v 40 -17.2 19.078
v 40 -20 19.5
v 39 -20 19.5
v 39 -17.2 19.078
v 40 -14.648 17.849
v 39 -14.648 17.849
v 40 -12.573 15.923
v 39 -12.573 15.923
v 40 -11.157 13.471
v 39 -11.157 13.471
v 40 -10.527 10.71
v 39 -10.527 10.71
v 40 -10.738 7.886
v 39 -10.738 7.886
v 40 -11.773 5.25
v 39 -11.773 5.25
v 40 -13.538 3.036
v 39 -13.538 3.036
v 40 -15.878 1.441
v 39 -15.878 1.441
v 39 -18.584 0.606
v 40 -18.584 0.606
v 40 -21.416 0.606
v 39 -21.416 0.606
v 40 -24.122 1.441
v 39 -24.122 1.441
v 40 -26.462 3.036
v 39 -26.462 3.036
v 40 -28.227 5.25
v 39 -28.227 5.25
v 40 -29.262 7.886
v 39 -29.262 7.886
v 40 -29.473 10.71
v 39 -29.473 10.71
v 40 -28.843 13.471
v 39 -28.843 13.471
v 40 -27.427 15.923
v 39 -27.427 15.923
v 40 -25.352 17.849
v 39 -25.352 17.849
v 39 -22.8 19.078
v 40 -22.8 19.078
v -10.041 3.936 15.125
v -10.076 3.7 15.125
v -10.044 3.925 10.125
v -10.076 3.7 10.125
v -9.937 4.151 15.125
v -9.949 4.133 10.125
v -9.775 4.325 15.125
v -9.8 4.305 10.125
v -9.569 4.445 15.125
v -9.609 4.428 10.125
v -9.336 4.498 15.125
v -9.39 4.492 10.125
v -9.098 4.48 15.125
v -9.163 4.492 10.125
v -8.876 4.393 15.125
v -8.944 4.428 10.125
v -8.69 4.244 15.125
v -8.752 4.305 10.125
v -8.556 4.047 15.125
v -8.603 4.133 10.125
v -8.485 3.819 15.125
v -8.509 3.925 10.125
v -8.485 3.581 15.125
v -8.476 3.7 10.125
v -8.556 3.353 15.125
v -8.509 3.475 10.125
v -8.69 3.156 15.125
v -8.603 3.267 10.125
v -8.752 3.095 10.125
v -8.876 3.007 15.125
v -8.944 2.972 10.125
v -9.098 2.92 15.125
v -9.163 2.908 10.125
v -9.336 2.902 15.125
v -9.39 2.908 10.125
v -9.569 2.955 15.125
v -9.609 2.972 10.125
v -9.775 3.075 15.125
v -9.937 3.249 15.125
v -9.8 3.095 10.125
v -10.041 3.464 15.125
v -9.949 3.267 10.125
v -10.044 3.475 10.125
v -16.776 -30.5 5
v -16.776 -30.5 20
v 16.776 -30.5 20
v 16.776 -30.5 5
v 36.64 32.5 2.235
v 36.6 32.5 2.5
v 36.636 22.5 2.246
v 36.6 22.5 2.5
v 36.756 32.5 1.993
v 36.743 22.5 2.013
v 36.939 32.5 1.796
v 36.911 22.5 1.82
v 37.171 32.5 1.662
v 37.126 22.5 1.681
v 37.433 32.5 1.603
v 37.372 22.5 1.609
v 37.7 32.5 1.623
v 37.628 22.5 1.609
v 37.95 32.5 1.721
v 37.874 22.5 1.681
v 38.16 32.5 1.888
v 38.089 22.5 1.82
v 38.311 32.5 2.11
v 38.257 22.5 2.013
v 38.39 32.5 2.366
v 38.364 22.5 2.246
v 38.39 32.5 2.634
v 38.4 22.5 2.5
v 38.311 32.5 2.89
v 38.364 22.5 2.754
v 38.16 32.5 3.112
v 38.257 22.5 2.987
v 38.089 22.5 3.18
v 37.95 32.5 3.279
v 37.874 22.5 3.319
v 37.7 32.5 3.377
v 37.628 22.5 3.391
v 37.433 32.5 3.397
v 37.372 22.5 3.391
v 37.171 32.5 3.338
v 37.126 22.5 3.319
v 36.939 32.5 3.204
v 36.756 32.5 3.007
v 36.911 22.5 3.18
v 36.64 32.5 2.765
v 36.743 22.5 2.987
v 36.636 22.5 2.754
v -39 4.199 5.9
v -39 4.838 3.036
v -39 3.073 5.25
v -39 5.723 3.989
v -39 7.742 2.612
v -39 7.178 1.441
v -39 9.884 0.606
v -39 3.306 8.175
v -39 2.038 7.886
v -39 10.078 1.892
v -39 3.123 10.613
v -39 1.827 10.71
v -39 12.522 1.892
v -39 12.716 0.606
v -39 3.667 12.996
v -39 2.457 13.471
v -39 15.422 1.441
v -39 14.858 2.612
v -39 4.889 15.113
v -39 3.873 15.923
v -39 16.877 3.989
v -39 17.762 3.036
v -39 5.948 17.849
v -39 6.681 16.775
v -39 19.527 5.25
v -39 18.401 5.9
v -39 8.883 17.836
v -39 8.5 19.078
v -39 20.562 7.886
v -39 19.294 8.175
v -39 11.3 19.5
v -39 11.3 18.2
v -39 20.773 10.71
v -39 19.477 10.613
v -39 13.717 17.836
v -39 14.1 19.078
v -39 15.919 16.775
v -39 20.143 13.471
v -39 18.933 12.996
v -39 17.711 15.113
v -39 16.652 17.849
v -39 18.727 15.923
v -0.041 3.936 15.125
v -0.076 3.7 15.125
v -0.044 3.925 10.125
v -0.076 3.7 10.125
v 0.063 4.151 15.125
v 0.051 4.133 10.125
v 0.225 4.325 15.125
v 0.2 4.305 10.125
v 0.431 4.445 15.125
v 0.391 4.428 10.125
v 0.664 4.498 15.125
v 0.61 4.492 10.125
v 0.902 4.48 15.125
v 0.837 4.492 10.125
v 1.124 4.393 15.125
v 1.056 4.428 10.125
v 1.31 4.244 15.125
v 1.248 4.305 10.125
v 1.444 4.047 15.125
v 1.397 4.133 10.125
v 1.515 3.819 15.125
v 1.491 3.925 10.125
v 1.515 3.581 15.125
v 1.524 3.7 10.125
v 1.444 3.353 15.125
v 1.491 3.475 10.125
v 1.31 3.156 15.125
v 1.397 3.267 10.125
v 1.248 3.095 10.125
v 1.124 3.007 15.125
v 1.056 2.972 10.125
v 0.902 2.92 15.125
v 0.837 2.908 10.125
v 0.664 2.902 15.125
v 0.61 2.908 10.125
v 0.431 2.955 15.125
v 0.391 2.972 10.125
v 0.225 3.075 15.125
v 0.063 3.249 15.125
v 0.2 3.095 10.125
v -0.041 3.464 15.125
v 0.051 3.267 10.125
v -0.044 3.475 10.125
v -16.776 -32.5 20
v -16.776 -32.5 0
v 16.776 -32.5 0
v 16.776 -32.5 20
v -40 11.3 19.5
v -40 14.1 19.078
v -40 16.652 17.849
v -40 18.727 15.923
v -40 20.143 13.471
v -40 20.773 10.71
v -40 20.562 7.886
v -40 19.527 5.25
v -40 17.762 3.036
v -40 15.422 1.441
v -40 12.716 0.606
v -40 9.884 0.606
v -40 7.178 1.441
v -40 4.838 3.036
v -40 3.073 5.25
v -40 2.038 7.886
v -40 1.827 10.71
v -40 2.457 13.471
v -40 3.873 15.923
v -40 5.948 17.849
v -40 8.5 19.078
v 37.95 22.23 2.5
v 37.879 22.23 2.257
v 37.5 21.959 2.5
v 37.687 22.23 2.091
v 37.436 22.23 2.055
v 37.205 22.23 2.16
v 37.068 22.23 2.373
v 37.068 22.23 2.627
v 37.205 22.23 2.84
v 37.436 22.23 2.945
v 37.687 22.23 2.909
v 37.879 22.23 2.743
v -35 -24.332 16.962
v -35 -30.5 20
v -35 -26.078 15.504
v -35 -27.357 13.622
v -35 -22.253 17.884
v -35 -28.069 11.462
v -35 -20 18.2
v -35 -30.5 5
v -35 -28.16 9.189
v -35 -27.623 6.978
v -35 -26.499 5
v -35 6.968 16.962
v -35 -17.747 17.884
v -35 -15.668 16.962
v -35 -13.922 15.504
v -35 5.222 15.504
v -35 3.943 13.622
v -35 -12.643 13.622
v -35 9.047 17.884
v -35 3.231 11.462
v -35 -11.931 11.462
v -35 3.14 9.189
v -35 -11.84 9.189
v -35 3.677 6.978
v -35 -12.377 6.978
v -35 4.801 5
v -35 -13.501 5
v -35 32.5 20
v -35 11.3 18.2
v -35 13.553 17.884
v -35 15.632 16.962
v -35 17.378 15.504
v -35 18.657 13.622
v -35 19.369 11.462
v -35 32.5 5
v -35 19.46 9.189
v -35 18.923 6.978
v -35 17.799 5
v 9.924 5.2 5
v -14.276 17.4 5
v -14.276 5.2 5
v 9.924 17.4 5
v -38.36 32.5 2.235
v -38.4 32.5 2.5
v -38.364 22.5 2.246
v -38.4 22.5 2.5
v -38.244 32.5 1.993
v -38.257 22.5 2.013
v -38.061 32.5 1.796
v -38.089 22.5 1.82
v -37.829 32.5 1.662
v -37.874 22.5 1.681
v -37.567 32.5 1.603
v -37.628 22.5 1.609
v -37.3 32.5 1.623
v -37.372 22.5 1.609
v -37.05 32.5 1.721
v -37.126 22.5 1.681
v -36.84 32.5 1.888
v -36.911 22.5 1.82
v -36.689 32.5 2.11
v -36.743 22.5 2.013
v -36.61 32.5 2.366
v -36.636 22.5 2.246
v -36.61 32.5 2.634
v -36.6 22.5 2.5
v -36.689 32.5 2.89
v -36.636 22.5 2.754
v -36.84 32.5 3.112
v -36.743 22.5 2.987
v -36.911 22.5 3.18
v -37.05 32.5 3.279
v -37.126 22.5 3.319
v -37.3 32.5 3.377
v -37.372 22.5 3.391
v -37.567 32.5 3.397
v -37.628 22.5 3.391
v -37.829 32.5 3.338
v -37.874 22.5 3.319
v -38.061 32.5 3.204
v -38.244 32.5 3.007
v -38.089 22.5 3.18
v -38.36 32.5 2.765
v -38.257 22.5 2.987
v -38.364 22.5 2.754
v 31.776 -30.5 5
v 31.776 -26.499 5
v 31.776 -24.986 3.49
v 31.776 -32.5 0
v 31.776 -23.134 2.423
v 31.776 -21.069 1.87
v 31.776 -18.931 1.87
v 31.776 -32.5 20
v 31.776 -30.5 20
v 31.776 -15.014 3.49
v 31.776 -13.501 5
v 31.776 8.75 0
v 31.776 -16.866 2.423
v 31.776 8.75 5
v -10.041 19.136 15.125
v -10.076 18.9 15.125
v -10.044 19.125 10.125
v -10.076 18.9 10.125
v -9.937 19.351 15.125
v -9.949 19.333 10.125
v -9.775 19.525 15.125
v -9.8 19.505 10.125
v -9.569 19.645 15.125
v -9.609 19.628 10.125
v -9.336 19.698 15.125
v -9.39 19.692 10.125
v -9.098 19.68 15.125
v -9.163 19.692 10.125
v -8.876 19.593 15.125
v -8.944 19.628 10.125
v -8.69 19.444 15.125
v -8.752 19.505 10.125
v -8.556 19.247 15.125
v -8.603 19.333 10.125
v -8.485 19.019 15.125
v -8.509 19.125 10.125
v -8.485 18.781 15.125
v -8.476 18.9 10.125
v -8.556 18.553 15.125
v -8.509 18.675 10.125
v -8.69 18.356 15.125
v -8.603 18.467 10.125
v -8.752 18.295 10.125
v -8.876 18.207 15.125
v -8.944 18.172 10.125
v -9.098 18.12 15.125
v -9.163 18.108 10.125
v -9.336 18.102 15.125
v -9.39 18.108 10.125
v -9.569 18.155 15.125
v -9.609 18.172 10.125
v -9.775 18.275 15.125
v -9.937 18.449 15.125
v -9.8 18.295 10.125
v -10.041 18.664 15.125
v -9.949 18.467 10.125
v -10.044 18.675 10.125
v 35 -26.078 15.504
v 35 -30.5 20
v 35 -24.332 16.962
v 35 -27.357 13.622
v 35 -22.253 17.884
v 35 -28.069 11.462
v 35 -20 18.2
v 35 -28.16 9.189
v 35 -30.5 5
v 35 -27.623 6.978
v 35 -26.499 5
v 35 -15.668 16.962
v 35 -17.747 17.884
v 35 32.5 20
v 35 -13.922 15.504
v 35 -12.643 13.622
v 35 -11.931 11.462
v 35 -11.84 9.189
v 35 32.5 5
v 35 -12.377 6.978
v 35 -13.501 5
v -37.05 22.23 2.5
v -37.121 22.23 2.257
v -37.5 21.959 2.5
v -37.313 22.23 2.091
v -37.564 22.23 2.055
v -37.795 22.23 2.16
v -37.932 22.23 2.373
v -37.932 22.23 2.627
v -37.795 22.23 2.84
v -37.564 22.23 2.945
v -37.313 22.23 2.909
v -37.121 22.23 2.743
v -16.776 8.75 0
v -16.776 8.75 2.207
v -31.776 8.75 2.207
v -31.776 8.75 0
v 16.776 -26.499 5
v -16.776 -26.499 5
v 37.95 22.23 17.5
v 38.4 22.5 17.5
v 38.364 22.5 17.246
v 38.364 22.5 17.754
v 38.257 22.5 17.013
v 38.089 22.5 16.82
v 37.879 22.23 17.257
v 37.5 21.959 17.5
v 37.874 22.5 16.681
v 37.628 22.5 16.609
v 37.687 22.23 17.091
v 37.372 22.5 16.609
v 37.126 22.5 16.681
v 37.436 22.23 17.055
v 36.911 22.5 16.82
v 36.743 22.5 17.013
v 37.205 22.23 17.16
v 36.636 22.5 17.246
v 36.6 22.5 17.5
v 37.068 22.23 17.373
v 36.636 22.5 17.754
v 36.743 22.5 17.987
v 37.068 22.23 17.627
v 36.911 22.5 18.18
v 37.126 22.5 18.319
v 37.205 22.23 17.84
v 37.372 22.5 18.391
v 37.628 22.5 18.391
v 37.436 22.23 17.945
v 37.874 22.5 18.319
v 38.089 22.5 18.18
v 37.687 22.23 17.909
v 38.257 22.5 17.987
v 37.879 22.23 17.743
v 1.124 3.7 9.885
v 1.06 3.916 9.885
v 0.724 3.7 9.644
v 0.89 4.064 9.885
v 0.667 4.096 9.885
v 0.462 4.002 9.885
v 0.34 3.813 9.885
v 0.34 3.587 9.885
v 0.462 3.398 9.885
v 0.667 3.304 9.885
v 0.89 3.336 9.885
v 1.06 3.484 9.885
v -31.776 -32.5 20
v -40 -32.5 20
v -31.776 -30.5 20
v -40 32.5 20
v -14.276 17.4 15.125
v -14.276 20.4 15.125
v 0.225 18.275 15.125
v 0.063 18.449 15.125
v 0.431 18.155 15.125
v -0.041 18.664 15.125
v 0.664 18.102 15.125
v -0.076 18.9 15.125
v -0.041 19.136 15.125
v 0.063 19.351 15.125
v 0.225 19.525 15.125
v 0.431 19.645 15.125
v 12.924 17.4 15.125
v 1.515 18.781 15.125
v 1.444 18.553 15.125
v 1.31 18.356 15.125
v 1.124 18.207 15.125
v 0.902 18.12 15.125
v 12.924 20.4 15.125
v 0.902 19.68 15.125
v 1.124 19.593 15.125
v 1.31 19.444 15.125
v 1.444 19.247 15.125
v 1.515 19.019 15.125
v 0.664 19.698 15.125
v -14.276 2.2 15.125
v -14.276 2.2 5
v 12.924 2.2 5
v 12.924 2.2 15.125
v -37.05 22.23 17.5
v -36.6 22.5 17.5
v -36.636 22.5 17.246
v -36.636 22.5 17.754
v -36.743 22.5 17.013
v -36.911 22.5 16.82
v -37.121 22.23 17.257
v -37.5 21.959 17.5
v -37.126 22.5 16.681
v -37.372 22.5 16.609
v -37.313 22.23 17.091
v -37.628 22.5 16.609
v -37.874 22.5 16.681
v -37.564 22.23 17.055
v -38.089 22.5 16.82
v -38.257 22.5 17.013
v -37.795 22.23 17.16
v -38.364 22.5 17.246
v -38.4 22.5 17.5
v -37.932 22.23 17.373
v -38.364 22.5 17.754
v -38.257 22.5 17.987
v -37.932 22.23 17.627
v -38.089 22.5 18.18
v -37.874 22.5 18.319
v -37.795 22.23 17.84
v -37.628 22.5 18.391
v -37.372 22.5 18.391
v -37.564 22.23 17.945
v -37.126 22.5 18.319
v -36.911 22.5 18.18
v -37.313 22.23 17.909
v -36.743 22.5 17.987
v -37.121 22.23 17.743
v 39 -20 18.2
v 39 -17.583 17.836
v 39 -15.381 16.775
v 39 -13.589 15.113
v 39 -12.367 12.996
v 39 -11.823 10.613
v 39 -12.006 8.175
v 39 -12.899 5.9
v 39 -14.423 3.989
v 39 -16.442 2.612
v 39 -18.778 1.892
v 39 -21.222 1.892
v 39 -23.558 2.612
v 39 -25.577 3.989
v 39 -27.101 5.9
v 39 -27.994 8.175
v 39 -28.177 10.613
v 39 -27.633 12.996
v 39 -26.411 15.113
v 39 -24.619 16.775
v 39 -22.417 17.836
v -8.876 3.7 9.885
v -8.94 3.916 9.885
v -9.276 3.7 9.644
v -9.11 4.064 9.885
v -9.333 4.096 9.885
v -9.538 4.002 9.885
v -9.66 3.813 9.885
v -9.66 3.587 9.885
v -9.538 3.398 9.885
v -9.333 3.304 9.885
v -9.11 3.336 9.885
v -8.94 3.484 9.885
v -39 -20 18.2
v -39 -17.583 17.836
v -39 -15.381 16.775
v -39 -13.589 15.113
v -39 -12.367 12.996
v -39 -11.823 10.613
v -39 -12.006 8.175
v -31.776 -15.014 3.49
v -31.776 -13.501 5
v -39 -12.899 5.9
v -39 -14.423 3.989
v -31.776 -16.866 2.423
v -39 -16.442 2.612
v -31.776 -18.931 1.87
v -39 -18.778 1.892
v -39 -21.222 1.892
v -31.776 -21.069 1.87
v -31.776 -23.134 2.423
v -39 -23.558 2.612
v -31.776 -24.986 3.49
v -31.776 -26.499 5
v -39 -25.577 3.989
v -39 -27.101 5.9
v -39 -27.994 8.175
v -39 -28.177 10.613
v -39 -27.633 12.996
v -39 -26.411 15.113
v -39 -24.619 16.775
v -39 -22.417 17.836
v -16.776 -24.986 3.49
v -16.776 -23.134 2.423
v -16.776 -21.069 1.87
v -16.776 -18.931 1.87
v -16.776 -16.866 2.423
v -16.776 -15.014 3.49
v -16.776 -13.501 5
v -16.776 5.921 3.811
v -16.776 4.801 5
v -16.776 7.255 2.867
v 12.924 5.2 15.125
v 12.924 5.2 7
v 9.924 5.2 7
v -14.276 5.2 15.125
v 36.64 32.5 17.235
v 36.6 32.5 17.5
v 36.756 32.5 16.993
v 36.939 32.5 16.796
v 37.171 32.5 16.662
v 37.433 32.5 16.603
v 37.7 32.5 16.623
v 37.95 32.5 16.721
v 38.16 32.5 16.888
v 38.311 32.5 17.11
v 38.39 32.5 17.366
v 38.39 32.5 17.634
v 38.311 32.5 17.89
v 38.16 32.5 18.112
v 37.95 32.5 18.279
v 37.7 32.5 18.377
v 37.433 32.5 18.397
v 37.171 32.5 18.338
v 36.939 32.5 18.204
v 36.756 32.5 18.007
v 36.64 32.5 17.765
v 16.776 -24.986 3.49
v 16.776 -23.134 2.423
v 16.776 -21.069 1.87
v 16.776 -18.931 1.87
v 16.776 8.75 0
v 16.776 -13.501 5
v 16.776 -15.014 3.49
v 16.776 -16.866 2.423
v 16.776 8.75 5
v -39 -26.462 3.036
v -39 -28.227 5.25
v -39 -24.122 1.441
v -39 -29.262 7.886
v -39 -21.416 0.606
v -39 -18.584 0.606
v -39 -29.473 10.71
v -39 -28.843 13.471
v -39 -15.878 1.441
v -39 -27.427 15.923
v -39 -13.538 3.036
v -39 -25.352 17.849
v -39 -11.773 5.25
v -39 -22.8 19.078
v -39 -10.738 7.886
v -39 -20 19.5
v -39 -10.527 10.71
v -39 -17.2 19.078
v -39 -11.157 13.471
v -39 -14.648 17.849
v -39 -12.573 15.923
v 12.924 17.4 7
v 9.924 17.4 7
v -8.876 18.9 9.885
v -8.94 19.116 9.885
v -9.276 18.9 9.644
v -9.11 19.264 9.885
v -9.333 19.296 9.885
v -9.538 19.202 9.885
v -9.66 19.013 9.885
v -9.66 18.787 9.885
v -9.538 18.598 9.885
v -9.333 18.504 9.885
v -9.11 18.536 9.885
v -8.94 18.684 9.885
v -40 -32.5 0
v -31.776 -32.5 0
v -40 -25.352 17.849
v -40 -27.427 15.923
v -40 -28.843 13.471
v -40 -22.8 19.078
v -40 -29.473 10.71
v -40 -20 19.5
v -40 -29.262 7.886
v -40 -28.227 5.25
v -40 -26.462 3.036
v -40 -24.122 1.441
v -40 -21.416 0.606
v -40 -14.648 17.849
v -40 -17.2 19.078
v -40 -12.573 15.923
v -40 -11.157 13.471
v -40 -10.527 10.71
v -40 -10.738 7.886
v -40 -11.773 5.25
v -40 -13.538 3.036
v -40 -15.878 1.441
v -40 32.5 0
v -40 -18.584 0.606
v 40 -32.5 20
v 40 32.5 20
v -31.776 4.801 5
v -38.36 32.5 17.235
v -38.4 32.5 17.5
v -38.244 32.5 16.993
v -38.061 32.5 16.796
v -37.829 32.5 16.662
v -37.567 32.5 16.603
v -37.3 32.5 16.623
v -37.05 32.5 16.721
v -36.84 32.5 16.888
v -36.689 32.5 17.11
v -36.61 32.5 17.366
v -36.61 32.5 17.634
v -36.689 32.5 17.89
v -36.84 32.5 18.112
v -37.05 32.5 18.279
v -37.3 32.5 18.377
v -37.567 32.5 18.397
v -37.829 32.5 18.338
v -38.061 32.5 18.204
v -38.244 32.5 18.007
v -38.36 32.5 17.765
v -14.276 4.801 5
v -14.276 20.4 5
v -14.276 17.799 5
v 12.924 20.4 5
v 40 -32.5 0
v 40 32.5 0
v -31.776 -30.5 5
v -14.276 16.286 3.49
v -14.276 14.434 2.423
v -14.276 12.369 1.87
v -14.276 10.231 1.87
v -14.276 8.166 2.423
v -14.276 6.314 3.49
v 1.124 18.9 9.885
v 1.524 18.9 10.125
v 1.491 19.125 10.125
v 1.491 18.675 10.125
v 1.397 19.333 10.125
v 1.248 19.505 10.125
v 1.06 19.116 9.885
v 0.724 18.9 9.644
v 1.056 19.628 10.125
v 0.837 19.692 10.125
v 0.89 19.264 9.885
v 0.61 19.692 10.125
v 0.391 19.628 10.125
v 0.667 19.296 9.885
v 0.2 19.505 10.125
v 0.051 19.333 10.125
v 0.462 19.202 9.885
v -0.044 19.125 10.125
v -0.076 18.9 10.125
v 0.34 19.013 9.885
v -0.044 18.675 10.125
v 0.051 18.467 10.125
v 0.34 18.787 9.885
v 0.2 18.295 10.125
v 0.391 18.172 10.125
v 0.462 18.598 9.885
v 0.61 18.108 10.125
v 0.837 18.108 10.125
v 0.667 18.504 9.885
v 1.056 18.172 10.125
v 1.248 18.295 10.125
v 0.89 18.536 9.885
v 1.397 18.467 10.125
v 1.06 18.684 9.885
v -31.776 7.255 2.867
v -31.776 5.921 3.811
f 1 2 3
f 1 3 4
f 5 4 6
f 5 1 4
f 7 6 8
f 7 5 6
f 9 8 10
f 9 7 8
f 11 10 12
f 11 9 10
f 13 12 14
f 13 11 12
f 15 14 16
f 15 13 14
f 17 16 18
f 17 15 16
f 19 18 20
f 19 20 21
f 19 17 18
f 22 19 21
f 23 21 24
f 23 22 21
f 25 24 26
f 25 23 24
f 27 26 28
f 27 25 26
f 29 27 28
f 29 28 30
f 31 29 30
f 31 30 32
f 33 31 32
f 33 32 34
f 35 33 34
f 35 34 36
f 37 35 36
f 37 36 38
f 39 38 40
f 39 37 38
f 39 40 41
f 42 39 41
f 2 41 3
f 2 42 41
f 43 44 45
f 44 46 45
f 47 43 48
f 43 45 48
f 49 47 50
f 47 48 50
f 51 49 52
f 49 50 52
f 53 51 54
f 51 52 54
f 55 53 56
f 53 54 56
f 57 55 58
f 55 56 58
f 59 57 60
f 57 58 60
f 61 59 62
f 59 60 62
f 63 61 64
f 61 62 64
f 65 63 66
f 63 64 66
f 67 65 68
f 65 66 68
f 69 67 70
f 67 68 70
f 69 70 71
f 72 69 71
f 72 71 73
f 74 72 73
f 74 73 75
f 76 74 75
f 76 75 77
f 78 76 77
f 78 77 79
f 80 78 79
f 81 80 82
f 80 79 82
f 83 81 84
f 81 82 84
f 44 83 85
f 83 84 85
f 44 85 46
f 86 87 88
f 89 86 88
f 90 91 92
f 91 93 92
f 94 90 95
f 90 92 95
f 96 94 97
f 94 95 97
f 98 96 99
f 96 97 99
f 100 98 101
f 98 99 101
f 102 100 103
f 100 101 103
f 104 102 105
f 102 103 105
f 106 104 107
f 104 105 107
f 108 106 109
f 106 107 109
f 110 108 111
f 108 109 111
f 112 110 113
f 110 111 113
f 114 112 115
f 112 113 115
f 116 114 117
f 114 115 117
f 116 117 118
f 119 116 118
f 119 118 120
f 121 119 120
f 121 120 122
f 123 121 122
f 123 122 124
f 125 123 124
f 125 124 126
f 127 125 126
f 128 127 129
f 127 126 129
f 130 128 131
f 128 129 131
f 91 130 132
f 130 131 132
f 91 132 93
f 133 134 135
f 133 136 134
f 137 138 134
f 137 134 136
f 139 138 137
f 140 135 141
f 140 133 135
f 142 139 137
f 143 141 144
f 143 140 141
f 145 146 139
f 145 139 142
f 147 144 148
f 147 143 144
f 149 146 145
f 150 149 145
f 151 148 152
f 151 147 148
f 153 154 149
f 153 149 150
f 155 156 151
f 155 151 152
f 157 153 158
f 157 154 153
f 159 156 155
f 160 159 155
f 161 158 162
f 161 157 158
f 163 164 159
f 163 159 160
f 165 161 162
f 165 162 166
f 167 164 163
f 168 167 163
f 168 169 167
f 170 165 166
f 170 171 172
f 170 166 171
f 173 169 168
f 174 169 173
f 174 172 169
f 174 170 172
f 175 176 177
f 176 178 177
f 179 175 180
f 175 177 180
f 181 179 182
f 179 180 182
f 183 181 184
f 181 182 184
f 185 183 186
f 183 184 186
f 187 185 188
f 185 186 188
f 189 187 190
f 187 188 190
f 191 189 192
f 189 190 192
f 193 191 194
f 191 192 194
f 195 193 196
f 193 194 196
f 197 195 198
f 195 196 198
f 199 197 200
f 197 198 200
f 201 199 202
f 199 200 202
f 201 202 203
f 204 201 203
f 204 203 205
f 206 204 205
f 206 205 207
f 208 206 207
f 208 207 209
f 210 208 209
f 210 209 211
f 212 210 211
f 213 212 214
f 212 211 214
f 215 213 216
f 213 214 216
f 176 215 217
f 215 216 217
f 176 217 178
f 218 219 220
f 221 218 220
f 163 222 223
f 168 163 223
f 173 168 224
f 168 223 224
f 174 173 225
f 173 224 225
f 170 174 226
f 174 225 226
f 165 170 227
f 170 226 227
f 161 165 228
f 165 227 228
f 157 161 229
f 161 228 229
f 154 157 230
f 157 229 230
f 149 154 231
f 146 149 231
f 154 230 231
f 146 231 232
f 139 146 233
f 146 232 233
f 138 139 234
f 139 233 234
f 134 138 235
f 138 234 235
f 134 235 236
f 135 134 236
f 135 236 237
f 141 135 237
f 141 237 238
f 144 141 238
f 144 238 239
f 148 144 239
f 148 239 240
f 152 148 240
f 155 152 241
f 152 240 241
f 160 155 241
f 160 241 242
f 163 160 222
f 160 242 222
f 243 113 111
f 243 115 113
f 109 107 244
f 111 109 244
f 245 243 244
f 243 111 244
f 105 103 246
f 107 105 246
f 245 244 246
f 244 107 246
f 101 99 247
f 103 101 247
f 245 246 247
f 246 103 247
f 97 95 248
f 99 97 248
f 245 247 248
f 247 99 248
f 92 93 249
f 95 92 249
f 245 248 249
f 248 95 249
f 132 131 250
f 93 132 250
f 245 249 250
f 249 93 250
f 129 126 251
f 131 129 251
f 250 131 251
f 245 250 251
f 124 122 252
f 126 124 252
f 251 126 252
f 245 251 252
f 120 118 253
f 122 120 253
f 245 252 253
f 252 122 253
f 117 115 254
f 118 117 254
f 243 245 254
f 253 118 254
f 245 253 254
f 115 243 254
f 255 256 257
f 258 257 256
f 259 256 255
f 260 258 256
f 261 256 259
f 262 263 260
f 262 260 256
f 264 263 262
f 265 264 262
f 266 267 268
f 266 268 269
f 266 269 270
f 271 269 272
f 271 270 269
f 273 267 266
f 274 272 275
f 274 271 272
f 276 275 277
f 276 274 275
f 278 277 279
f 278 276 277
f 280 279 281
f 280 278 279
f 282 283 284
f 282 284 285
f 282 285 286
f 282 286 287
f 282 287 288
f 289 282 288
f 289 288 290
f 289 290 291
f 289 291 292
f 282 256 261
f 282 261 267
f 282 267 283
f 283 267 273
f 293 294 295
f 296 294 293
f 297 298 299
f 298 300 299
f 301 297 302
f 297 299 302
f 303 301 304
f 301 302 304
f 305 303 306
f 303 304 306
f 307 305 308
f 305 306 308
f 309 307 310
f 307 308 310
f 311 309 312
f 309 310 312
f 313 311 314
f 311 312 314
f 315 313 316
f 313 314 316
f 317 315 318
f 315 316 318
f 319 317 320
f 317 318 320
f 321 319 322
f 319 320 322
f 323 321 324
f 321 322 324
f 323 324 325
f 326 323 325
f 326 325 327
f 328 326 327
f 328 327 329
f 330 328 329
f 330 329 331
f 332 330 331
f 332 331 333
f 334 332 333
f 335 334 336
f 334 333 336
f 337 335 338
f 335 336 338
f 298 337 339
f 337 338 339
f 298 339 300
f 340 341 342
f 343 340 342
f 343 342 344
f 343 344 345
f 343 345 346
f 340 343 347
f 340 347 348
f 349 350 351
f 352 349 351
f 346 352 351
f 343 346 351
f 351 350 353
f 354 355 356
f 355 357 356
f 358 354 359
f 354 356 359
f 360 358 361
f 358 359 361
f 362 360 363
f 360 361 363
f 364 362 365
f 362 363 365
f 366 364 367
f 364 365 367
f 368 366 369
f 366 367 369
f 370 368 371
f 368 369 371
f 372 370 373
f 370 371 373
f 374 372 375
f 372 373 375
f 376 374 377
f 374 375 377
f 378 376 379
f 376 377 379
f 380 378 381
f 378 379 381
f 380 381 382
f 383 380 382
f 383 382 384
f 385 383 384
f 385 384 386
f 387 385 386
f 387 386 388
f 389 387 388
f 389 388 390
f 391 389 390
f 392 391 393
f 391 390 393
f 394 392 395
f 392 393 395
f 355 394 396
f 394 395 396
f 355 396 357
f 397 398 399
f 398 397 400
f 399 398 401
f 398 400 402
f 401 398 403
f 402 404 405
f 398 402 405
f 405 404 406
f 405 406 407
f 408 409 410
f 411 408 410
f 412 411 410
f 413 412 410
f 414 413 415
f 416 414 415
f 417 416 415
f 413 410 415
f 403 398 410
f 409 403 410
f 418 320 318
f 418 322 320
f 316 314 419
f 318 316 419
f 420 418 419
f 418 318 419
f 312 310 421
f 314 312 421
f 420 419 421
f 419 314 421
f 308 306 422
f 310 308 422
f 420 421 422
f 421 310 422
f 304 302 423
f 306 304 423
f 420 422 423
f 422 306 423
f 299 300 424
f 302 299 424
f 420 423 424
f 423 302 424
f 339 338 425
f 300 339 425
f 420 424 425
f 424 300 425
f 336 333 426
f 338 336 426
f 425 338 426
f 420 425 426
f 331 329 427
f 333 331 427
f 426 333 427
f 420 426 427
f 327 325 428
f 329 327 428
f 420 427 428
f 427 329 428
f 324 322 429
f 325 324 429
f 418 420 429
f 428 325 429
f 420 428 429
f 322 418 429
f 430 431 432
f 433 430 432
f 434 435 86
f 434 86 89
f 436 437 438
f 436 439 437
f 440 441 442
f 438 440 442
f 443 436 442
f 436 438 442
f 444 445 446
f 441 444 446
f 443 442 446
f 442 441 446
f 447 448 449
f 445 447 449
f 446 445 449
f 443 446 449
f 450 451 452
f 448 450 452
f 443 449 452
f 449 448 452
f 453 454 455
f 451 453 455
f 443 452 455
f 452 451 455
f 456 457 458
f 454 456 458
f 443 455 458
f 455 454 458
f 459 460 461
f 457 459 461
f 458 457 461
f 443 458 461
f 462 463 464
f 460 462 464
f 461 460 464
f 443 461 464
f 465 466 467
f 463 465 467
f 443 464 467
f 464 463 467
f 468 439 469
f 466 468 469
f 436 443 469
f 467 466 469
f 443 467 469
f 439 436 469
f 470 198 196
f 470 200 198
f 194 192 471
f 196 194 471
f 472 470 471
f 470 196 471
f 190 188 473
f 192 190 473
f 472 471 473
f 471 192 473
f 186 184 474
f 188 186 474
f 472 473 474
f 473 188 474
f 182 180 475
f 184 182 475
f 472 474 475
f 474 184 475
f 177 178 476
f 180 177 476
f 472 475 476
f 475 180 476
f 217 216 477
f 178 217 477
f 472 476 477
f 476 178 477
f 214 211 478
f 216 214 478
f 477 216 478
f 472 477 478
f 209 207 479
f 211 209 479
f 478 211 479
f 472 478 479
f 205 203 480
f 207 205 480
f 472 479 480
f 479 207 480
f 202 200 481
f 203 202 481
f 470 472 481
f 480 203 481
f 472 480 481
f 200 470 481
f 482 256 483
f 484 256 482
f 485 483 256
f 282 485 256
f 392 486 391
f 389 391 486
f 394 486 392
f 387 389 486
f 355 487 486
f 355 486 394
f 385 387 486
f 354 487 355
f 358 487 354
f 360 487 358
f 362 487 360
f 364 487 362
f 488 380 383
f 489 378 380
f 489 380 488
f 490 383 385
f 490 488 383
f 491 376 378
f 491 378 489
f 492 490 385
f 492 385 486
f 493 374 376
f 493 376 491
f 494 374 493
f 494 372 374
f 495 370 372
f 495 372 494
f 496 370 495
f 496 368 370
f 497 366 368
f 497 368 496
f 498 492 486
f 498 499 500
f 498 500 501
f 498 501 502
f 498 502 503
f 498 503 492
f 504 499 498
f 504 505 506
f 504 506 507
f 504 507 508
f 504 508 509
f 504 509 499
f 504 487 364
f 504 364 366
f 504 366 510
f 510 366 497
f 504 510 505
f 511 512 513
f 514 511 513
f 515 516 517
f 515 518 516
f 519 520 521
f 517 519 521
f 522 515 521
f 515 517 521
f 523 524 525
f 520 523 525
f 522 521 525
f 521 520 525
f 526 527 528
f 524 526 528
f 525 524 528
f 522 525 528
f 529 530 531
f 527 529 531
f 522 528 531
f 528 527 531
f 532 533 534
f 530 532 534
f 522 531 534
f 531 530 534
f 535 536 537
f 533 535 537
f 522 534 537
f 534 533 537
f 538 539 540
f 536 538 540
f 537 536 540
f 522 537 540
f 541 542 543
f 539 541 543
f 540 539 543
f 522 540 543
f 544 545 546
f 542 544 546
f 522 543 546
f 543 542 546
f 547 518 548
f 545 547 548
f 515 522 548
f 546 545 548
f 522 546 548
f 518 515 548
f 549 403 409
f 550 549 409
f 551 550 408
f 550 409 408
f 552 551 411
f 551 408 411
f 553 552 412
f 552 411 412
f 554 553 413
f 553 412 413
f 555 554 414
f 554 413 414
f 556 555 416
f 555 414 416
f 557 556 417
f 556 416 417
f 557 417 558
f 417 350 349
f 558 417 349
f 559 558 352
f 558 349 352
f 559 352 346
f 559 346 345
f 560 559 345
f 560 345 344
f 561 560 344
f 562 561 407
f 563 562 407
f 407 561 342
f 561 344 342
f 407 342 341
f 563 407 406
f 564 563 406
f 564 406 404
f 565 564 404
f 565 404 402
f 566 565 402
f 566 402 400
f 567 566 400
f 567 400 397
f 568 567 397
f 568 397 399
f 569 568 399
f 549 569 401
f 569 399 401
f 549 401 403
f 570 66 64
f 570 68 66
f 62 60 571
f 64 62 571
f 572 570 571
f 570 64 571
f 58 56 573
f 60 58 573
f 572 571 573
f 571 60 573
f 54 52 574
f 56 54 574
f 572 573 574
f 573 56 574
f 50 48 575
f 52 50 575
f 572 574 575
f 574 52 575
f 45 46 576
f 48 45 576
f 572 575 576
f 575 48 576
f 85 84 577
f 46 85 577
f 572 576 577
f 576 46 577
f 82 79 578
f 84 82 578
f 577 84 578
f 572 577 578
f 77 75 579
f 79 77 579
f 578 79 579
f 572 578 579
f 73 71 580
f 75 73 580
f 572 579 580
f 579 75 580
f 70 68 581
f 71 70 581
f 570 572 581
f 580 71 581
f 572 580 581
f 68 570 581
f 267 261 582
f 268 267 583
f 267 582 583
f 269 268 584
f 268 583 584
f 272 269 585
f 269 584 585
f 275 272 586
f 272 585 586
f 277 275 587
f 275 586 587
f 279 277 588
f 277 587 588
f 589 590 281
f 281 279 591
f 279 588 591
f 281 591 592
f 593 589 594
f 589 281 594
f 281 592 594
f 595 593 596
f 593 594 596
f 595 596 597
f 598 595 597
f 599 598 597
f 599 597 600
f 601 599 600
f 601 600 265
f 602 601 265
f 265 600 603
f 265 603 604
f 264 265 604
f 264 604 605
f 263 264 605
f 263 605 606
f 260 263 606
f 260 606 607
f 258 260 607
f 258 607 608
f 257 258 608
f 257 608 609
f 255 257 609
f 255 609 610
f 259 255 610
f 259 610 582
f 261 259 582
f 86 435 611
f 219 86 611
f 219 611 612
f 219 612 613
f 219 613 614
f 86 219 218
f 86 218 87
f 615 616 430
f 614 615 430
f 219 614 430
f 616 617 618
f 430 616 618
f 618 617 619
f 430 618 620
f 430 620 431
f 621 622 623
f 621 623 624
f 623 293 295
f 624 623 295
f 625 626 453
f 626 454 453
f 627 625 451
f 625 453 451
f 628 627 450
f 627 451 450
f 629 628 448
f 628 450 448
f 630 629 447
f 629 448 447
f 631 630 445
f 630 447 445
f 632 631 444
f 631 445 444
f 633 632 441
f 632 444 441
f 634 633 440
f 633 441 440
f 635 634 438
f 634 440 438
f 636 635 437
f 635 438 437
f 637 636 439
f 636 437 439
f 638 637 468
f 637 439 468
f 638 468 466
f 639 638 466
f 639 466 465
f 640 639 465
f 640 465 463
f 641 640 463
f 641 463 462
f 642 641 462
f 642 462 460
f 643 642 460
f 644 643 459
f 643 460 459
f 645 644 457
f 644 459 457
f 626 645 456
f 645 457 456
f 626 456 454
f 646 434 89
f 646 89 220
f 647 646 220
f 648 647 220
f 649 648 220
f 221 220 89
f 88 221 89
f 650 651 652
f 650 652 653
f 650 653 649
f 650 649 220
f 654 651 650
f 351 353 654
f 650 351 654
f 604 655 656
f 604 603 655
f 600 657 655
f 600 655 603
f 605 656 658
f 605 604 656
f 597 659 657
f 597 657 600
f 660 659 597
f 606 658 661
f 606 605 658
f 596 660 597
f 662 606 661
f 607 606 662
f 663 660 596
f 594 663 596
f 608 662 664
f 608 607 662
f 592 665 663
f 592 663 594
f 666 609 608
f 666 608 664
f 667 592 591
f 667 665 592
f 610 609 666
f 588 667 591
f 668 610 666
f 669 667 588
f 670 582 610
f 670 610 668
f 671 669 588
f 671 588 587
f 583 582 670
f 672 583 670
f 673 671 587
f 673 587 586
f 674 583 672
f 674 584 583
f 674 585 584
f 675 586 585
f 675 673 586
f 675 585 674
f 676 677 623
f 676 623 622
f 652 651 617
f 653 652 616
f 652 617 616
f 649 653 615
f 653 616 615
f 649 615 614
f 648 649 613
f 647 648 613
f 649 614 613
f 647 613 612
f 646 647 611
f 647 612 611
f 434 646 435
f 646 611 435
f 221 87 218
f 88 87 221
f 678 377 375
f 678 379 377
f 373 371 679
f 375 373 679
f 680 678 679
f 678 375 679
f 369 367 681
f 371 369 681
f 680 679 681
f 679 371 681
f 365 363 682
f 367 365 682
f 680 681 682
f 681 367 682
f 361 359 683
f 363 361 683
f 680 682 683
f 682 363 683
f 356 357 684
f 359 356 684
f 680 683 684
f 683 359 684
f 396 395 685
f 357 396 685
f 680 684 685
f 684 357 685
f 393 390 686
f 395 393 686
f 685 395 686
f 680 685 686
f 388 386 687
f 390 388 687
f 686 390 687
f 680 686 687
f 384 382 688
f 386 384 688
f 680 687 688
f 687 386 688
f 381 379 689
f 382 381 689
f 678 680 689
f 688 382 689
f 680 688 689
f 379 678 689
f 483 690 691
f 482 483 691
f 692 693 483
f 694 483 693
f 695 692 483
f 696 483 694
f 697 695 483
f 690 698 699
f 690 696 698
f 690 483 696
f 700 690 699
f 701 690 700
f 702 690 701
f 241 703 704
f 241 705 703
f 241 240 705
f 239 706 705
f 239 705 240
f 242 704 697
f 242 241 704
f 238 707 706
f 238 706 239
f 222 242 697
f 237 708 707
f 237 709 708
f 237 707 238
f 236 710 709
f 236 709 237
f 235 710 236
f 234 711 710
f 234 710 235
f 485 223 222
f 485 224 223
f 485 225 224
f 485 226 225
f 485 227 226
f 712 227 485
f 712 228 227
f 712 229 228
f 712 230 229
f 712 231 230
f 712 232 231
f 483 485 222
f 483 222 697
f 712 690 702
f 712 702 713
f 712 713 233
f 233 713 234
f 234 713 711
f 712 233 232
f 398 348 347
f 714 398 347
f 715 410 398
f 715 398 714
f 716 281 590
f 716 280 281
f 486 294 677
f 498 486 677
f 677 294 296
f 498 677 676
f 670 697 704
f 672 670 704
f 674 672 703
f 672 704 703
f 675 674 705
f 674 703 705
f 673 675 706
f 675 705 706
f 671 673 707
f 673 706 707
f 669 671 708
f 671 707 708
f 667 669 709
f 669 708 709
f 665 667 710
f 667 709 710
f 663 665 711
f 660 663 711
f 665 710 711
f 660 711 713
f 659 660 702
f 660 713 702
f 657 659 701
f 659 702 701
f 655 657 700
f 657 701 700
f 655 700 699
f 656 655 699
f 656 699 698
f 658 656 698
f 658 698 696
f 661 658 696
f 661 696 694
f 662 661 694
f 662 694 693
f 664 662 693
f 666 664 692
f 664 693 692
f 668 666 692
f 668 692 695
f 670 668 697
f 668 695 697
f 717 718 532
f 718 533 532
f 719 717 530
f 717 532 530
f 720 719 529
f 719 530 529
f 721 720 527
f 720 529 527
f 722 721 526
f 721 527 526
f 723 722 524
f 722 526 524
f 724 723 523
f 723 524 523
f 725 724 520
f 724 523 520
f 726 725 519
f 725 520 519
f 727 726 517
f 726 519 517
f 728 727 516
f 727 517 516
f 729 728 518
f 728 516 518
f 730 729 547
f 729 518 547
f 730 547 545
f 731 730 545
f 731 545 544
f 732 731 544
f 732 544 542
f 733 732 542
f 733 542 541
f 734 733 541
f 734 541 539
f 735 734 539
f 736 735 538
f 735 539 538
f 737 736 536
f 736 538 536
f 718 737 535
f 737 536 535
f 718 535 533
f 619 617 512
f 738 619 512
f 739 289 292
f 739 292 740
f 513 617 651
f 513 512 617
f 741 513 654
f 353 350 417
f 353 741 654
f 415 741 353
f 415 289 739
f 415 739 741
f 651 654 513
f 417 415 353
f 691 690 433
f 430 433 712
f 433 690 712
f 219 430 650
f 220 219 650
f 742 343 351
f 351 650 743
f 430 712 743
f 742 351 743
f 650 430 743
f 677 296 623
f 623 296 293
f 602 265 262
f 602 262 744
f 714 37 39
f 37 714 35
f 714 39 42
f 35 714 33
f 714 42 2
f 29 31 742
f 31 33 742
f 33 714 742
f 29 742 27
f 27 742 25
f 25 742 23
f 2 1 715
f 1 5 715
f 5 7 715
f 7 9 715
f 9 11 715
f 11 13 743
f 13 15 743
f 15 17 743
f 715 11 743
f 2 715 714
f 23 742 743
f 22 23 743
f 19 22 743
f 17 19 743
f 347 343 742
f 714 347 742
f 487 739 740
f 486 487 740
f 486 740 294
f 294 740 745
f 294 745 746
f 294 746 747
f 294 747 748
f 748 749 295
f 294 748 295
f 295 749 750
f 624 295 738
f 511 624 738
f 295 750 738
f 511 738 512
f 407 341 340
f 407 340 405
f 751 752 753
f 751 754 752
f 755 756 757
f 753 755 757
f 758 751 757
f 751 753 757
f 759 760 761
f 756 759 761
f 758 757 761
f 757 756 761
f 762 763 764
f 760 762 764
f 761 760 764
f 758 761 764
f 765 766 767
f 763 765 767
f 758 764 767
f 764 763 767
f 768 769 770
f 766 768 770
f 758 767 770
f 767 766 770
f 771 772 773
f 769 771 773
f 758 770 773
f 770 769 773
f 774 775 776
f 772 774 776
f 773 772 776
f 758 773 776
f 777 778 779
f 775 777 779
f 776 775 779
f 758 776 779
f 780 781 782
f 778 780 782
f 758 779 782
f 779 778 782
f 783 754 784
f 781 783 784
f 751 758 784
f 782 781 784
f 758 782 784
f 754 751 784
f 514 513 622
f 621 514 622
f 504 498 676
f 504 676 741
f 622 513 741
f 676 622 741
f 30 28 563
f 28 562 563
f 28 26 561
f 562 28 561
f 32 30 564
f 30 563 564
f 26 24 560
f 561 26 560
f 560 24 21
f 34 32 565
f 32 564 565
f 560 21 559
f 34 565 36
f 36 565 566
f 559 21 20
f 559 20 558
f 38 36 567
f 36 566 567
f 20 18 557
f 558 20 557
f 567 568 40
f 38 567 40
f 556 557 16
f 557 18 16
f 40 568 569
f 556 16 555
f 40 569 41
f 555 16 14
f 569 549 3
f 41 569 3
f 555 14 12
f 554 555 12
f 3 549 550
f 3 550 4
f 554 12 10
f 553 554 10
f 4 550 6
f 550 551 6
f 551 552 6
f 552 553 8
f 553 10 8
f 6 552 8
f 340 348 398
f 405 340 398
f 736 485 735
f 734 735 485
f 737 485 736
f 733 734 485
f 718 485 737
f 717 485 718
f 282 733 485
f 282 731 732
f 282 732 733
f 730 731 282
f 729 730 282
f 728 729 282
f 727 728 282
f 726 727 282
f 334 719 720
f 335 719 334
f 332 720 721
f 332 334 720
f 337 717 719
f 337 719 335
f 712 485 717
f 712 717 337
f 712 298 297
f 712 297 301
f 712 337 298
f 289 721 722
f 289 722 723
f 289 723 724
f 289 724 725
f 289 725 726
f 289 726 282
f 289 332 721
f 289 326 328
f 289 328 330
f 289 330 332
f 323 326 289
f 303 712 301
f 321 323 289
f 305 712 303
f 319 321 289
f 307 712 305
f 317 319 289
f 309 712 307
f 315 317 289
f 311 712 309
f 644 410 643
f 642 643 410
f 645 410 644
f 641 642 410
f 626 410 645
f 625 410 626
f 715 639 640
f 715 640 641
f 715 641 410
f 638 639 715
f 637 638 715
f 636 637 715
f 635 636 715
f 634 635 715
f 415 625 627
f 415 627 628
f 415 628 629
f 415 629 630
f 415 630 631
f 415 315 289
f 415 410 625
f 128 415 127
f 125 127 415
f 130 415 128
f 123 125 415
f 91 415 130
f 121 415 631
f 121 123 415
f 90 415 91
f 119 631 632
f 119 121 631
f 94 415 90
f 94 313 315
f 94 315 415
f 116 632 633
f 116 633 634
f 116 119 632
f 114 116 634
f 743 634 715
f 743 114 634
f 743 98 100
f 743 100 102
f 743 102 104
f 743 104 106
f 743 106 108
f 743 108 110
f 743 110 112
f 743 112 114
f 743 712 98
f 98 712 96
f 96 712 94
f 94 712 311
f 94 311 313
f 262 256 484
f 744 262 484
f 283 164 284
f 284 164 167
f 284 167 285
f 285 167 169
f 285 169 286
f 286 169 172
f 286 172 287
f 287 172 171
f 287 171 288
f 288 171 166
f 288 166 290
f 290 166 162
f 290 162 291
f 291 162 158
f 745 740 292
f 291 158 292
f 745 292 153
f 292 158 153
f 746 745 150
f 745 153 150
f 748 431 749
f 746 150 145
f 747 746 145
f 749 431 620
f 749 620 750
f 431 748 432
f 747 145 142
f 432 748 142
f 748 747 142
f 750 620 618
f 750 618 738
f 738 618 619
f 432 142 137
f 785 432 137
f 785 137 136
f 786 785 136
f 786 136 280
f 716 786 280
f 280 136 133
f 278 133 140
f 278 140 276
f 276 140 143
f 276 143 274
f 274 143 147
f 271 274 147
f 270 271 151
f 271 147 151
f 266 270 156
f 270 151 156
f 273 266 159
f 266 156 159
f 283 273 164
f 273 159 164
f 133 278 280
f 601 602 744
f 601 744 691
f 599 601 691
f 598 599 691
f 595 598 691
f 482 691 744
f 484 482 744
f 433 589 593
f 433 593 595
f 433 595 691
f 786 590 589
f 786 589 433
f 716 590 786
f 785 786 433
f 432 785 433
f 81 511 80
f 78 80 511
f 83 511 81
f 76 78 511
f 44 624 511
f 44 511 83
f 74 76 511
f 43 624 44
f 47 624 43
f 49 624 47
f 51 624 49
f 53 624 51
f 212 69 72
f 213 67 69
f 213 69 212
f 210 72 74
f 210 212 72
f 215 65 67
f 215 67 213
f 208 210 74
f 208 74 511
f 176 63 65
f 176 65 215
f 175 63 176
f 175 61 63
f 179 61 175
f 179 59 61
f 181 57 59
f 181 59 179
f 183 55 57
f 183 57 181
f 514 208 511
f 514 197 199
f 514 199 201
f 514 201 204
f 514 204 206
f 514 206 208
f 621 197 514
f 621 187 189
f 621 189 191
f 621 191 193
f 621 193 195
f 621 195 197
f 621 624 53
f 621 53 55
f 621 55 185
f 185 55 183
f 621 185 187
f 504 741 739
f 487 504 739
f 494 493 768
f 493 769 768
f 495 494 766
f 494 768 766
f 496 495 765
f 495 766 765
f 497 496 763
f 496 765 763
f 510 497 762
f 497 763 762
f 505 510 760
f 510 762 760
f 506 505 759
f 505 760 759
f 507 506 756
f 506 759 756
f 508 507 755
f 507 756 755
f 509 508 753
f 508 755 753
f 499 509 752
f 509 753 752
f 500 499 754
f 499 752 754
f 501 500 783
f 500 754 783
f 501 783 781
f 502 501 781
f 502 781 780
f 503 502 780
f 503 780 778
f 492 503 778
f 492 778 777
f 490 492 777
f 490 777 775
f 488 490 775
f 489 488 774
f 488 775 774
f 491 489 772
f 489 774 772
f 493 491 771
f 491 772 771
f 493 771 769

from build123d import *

# Parameters (mm, degrees)
SKETCH1_W                       = 80
SKETCH1_H                       = 65
BOSS_EXTRUDE1_DEPTH             = 20
SKETCH2_W                       = 70
SKETCH2_H                       = 61
CUT_EXTRUDE1_DEPTH              = 15
CUT_EXTRUDE7_REACH              = 80.899
SKETCH9_W                       = 70
SKETCH9_H                       = 15
BOSS_EXTRUDE2_DEPTH             = 10.125
SKETCH3_3_W                     = 3
SKETCH3_3_H                     = 6.1
BOSS_EXTRUDE3_DEPTH             = 2
TAP_DRILL_FOR_M2X0_4_TAP1_D     = 1.6
TAP_DRILL_FOR_M2X0_4_TAP1_DEPTH = 5
TAP_DRILL_FOR_M2X0_4_TAP1_TIP   = 0.480688495
CUT_EXTRUDE2_REACH              = 90.635
SKETCH7_R                       = 8.2
SKETCH7_3_R                     = 9.5
CUT_EXTRUDE3_DEPTH              = 1
SKETCH7_4_R                     = 8.2
CUT_EXTRUDE4_DEPTH              = 89.635489506
SKETCH7_5_R                     = 9.5
SKETCH7_5_R_2                   = 8.2
CUT_EXTRUDE5_DEPTH              = 1
CUT_EXTRUDE6_DEPTH              = 56.283360969
CUT_EXTRUDE6_DEPTH_BACK         = 56.283360969
SKETCH8_W                       = 15
SKETCH8_H                       = 57.5
TAP_DRILL_FOR_M2X0_4_TAP2_D     = 1.8
TAP_DRILL_FOR_M2X0_4_TAP2_DEPTH = 10
TAP_DRILL_FOR_M2X0_4_TAP2_TIP   = 0.540774557


with BuildPart() as part:
    # Sketch1 → Boss-Extrude1 (new body)
    with BuildSketch(Plane.XY):
        Rectangle(SKETCH1_W, SKETCH1_H)
    extrude(amount=BOSS_EXTRUDE1_DEPTH)

    # Sketch2 → Cut-Extrude1 (cut)
    with BuildSketch(Plane.XY.offset(20)):
        Rectangle(SKETCH2_W, SKETCH2_H)
    extrude(amount=-CUT_EXTRUDE1_DEPTH, mode=Mode.SUBTRACT)

    # Sketch9 → Cut-Extrude7 (cut, up to next)
    with BuildSketch(Plane(origin=(0, 32.5, 0), x_dir=(1, 0, 0), z_dir=(0, 1, 0)), mode=Mode.PRIVATE) as cut_extrude7_sk1:
        with Locations((0, -12.5)):
            Rectangle(SKETCH9_W, SKETCH9_H)
    cut_extrude7_tool1 = extrude(cut_extrude7_sk1.sketch, amount=-CUT_EXTRUDE7_REACH, mode=Mode.PRIVATE) & part.part
    add(cut_extrude7_tool1.solids().sort_by_distance((0, 32.5, 12.5))[0], mode=Mode.SUBTRACT)

    # Sketch3 → Boss-Extrude2 (add)
    with BuildSketch(Plane.XY.offset(5)):
        Polygon((12.923634865, 20.4), (-14.276365135, 20.4), (-14.276365135, 17.4), (9.923634865, 17.4), (12.923634865, 17.4), align=None)
        Polygon((12.923634865, 5.2), (9.923634865, 5.2), (-14.276365135, 5.2), (-14.276365135, 2.2), (12.923634865, 2.2), align=None)
    extrude(amount=BOSS_EXTRUDE2_DEPTH)

    # Sketch3<3> → Boss-Extrude3 (add)
    with BuildSketch(Plane.XY.offset(5)):
        with Locations((11.423634865, 14.35)):
            Rectangle(SKETCH3_3_W, SKETCH3_3_H)
        with Locations((11.423634865, 8.25)):
            Rectangle(SKETCH3_3_W, SKETCH3_3_H)
    extrude(amount=BOSS_EXTRUDE3_DEPTH)

    # Tap Drill for M2x0.4 Tap1
    with Locations(Plane.XY.offset(15.125)):
        with Locations((-9.276365135, 18.9), (0.723634865, 18.9), (0.723634865, 3.7), (-9.276365135, 3.7)):
            Hole(TAP_DRILL_FOR_M2X0_4_TAP1_D / 2, depth=TAP_DRILL_FOR_M2X0_4_TAP1_DEPTH)
            with Locations((0, 0, -(TAP_DRILL_FOR_M2X0_4_TAP1_DEPTH + TAP_DRILL_FOR_M2X0_4_TAP1_TIP / 2))):  # 118° drill point
                Cone(0, TAP_DRILL_FOR_M2X0_4_TAP1_D / 2, TAP_DRILL_FOR_M2X0_4_TAP1_TIP, mode=Mode.SUBTRACT)

    # Cut-Extrude2: up to this face of the body (flat: up to its plane)
    cut_extrude2_end = Plane(part.part.faces().sort_by_distance((-14.276365135, 18.9, 10.0625))[0])
    # Sketch7 → Cut-Extrude2 (cut, up to the picked face)
    with BuildSketch(Plane.ZY.offset(40), mode=Mode.PRIVATE) as cut_extrude2_sk1:
        with Locations((10, 11.3)):
            Circle(SKETCH7_R)
    cut_extrude2_tool1 = split(extrude(cut_extrude2_sk1.sketch, amount=-CUT_EXTRUDE2_REACH, mode=Mode.PRIVATE), bisect_by=cut_extrude2_end, keep=Keep.BOTH, mode=Mode.PRIVATE)
    add(cut_extrude2_tool1.solids().sort_by(Axis((-40, 11.3, 10), (1, 0, 0)))[0], mode=Mode.SUBTRACT)

    # Sketch7<3> → Cut-Extrude3 (cut)
    with BuildSketch(Plane.ZY.offset(40)):
        with Locations((10, 11.3)):
            Circle(SKETCH7_3_R)
    extrude(amount=-CUT_EXTRUDE3_DEPTH, mode=Mode.SUBTRACT)

    # Sketch7<4> → Cut-Extrude4 (cut, through all)
    with BuildSketch(Plane.ZY.offset(40)):
        with Locations((10, -20)):
            Circle(SKETCH7_4_R)
    extrude(amount=-CUT_EXTRUDE4_DEPTH, mode=Mode.SUBTRACT)

    # Sketch7<5> → Cut-Extrude5 (cut)
    with BuildSketch(Plane.ZY.offset(40)):
        with Locations((10, -20)):
            Circle(SKETCH7_5_R)
        with Locations((10, -20)):
            Circle(SKETCH7_5_R_2, mode=Mode.SUBTRACT)
    cut_extrude5 = extrude(amount=-CUT_EXTRUDE5_DEPTH, mode=Mode.SUBTRACT)

    # Mirror1: Cut-Extrude5 across plane
    add(cut_extrude5.mirror(Plane(origin=(0, 0, 0), x_dir=(0, 0, 1), z_dir=(1, 0, 0))), mode=Mode.SUBTRACT)

    # Sketch8 → Cut-Extrude6 (cut, two sides: drawn at the far end of the back side and taken through both)
    with BuildSketch(Plane(origin=(0, 0, 0), x_dir=(-1, 0, 0), z_dir=(0, 0, -1)).offset(-CUT_EXTRUDE6_DEPTH_BACK)):
        with Locations((24.276365135, -20)):
            Rectangle(SKETCH8_W, SKETCH8_H)
        with Locations((-24.276365135, -20)):
            Rectangle(SKETCH8_W, SKETCH8_H)
    extrude(amount=CUT_EXTRUDE6_DEPTH + CUT_EXTRUDE6_DEPTH_BACK, mode=Mode.SUBTRACT)

    # Tap Drill for M2x0.4 Tap2
    with Locations(Plane(origin=(0, 32.5, 0), x_dir=(1, 0, 0), z_dir=(0, 1, 0))):
        with Locations((-37.5, -17.5), (-37.5, -2.5), (37.5, -2.5), (37.5, -17.5)):
            Hole(TAP_DRILL_FOR_M2X0_4_TAP2_D / 2, depth=TAP_DRILL_FOR_M2X0_4_TAP2_DEPTH)
            with Locations((0, 0, -(TAP_DRILL_FOR_M2X0_4_TAP2_DEPTH + TAP_DRILL_FOR_M2X0_4_TAP2_TIP / 2))):  # 118° drill point
                Cone(0, TAP_DRILL_FOR_M2X0_4_TAP2_D / 2, TAP_DRILL_FOR_M2X0_4_TAP2_TIP, mode=Mode.SUBTRACT)


solid = part.part
